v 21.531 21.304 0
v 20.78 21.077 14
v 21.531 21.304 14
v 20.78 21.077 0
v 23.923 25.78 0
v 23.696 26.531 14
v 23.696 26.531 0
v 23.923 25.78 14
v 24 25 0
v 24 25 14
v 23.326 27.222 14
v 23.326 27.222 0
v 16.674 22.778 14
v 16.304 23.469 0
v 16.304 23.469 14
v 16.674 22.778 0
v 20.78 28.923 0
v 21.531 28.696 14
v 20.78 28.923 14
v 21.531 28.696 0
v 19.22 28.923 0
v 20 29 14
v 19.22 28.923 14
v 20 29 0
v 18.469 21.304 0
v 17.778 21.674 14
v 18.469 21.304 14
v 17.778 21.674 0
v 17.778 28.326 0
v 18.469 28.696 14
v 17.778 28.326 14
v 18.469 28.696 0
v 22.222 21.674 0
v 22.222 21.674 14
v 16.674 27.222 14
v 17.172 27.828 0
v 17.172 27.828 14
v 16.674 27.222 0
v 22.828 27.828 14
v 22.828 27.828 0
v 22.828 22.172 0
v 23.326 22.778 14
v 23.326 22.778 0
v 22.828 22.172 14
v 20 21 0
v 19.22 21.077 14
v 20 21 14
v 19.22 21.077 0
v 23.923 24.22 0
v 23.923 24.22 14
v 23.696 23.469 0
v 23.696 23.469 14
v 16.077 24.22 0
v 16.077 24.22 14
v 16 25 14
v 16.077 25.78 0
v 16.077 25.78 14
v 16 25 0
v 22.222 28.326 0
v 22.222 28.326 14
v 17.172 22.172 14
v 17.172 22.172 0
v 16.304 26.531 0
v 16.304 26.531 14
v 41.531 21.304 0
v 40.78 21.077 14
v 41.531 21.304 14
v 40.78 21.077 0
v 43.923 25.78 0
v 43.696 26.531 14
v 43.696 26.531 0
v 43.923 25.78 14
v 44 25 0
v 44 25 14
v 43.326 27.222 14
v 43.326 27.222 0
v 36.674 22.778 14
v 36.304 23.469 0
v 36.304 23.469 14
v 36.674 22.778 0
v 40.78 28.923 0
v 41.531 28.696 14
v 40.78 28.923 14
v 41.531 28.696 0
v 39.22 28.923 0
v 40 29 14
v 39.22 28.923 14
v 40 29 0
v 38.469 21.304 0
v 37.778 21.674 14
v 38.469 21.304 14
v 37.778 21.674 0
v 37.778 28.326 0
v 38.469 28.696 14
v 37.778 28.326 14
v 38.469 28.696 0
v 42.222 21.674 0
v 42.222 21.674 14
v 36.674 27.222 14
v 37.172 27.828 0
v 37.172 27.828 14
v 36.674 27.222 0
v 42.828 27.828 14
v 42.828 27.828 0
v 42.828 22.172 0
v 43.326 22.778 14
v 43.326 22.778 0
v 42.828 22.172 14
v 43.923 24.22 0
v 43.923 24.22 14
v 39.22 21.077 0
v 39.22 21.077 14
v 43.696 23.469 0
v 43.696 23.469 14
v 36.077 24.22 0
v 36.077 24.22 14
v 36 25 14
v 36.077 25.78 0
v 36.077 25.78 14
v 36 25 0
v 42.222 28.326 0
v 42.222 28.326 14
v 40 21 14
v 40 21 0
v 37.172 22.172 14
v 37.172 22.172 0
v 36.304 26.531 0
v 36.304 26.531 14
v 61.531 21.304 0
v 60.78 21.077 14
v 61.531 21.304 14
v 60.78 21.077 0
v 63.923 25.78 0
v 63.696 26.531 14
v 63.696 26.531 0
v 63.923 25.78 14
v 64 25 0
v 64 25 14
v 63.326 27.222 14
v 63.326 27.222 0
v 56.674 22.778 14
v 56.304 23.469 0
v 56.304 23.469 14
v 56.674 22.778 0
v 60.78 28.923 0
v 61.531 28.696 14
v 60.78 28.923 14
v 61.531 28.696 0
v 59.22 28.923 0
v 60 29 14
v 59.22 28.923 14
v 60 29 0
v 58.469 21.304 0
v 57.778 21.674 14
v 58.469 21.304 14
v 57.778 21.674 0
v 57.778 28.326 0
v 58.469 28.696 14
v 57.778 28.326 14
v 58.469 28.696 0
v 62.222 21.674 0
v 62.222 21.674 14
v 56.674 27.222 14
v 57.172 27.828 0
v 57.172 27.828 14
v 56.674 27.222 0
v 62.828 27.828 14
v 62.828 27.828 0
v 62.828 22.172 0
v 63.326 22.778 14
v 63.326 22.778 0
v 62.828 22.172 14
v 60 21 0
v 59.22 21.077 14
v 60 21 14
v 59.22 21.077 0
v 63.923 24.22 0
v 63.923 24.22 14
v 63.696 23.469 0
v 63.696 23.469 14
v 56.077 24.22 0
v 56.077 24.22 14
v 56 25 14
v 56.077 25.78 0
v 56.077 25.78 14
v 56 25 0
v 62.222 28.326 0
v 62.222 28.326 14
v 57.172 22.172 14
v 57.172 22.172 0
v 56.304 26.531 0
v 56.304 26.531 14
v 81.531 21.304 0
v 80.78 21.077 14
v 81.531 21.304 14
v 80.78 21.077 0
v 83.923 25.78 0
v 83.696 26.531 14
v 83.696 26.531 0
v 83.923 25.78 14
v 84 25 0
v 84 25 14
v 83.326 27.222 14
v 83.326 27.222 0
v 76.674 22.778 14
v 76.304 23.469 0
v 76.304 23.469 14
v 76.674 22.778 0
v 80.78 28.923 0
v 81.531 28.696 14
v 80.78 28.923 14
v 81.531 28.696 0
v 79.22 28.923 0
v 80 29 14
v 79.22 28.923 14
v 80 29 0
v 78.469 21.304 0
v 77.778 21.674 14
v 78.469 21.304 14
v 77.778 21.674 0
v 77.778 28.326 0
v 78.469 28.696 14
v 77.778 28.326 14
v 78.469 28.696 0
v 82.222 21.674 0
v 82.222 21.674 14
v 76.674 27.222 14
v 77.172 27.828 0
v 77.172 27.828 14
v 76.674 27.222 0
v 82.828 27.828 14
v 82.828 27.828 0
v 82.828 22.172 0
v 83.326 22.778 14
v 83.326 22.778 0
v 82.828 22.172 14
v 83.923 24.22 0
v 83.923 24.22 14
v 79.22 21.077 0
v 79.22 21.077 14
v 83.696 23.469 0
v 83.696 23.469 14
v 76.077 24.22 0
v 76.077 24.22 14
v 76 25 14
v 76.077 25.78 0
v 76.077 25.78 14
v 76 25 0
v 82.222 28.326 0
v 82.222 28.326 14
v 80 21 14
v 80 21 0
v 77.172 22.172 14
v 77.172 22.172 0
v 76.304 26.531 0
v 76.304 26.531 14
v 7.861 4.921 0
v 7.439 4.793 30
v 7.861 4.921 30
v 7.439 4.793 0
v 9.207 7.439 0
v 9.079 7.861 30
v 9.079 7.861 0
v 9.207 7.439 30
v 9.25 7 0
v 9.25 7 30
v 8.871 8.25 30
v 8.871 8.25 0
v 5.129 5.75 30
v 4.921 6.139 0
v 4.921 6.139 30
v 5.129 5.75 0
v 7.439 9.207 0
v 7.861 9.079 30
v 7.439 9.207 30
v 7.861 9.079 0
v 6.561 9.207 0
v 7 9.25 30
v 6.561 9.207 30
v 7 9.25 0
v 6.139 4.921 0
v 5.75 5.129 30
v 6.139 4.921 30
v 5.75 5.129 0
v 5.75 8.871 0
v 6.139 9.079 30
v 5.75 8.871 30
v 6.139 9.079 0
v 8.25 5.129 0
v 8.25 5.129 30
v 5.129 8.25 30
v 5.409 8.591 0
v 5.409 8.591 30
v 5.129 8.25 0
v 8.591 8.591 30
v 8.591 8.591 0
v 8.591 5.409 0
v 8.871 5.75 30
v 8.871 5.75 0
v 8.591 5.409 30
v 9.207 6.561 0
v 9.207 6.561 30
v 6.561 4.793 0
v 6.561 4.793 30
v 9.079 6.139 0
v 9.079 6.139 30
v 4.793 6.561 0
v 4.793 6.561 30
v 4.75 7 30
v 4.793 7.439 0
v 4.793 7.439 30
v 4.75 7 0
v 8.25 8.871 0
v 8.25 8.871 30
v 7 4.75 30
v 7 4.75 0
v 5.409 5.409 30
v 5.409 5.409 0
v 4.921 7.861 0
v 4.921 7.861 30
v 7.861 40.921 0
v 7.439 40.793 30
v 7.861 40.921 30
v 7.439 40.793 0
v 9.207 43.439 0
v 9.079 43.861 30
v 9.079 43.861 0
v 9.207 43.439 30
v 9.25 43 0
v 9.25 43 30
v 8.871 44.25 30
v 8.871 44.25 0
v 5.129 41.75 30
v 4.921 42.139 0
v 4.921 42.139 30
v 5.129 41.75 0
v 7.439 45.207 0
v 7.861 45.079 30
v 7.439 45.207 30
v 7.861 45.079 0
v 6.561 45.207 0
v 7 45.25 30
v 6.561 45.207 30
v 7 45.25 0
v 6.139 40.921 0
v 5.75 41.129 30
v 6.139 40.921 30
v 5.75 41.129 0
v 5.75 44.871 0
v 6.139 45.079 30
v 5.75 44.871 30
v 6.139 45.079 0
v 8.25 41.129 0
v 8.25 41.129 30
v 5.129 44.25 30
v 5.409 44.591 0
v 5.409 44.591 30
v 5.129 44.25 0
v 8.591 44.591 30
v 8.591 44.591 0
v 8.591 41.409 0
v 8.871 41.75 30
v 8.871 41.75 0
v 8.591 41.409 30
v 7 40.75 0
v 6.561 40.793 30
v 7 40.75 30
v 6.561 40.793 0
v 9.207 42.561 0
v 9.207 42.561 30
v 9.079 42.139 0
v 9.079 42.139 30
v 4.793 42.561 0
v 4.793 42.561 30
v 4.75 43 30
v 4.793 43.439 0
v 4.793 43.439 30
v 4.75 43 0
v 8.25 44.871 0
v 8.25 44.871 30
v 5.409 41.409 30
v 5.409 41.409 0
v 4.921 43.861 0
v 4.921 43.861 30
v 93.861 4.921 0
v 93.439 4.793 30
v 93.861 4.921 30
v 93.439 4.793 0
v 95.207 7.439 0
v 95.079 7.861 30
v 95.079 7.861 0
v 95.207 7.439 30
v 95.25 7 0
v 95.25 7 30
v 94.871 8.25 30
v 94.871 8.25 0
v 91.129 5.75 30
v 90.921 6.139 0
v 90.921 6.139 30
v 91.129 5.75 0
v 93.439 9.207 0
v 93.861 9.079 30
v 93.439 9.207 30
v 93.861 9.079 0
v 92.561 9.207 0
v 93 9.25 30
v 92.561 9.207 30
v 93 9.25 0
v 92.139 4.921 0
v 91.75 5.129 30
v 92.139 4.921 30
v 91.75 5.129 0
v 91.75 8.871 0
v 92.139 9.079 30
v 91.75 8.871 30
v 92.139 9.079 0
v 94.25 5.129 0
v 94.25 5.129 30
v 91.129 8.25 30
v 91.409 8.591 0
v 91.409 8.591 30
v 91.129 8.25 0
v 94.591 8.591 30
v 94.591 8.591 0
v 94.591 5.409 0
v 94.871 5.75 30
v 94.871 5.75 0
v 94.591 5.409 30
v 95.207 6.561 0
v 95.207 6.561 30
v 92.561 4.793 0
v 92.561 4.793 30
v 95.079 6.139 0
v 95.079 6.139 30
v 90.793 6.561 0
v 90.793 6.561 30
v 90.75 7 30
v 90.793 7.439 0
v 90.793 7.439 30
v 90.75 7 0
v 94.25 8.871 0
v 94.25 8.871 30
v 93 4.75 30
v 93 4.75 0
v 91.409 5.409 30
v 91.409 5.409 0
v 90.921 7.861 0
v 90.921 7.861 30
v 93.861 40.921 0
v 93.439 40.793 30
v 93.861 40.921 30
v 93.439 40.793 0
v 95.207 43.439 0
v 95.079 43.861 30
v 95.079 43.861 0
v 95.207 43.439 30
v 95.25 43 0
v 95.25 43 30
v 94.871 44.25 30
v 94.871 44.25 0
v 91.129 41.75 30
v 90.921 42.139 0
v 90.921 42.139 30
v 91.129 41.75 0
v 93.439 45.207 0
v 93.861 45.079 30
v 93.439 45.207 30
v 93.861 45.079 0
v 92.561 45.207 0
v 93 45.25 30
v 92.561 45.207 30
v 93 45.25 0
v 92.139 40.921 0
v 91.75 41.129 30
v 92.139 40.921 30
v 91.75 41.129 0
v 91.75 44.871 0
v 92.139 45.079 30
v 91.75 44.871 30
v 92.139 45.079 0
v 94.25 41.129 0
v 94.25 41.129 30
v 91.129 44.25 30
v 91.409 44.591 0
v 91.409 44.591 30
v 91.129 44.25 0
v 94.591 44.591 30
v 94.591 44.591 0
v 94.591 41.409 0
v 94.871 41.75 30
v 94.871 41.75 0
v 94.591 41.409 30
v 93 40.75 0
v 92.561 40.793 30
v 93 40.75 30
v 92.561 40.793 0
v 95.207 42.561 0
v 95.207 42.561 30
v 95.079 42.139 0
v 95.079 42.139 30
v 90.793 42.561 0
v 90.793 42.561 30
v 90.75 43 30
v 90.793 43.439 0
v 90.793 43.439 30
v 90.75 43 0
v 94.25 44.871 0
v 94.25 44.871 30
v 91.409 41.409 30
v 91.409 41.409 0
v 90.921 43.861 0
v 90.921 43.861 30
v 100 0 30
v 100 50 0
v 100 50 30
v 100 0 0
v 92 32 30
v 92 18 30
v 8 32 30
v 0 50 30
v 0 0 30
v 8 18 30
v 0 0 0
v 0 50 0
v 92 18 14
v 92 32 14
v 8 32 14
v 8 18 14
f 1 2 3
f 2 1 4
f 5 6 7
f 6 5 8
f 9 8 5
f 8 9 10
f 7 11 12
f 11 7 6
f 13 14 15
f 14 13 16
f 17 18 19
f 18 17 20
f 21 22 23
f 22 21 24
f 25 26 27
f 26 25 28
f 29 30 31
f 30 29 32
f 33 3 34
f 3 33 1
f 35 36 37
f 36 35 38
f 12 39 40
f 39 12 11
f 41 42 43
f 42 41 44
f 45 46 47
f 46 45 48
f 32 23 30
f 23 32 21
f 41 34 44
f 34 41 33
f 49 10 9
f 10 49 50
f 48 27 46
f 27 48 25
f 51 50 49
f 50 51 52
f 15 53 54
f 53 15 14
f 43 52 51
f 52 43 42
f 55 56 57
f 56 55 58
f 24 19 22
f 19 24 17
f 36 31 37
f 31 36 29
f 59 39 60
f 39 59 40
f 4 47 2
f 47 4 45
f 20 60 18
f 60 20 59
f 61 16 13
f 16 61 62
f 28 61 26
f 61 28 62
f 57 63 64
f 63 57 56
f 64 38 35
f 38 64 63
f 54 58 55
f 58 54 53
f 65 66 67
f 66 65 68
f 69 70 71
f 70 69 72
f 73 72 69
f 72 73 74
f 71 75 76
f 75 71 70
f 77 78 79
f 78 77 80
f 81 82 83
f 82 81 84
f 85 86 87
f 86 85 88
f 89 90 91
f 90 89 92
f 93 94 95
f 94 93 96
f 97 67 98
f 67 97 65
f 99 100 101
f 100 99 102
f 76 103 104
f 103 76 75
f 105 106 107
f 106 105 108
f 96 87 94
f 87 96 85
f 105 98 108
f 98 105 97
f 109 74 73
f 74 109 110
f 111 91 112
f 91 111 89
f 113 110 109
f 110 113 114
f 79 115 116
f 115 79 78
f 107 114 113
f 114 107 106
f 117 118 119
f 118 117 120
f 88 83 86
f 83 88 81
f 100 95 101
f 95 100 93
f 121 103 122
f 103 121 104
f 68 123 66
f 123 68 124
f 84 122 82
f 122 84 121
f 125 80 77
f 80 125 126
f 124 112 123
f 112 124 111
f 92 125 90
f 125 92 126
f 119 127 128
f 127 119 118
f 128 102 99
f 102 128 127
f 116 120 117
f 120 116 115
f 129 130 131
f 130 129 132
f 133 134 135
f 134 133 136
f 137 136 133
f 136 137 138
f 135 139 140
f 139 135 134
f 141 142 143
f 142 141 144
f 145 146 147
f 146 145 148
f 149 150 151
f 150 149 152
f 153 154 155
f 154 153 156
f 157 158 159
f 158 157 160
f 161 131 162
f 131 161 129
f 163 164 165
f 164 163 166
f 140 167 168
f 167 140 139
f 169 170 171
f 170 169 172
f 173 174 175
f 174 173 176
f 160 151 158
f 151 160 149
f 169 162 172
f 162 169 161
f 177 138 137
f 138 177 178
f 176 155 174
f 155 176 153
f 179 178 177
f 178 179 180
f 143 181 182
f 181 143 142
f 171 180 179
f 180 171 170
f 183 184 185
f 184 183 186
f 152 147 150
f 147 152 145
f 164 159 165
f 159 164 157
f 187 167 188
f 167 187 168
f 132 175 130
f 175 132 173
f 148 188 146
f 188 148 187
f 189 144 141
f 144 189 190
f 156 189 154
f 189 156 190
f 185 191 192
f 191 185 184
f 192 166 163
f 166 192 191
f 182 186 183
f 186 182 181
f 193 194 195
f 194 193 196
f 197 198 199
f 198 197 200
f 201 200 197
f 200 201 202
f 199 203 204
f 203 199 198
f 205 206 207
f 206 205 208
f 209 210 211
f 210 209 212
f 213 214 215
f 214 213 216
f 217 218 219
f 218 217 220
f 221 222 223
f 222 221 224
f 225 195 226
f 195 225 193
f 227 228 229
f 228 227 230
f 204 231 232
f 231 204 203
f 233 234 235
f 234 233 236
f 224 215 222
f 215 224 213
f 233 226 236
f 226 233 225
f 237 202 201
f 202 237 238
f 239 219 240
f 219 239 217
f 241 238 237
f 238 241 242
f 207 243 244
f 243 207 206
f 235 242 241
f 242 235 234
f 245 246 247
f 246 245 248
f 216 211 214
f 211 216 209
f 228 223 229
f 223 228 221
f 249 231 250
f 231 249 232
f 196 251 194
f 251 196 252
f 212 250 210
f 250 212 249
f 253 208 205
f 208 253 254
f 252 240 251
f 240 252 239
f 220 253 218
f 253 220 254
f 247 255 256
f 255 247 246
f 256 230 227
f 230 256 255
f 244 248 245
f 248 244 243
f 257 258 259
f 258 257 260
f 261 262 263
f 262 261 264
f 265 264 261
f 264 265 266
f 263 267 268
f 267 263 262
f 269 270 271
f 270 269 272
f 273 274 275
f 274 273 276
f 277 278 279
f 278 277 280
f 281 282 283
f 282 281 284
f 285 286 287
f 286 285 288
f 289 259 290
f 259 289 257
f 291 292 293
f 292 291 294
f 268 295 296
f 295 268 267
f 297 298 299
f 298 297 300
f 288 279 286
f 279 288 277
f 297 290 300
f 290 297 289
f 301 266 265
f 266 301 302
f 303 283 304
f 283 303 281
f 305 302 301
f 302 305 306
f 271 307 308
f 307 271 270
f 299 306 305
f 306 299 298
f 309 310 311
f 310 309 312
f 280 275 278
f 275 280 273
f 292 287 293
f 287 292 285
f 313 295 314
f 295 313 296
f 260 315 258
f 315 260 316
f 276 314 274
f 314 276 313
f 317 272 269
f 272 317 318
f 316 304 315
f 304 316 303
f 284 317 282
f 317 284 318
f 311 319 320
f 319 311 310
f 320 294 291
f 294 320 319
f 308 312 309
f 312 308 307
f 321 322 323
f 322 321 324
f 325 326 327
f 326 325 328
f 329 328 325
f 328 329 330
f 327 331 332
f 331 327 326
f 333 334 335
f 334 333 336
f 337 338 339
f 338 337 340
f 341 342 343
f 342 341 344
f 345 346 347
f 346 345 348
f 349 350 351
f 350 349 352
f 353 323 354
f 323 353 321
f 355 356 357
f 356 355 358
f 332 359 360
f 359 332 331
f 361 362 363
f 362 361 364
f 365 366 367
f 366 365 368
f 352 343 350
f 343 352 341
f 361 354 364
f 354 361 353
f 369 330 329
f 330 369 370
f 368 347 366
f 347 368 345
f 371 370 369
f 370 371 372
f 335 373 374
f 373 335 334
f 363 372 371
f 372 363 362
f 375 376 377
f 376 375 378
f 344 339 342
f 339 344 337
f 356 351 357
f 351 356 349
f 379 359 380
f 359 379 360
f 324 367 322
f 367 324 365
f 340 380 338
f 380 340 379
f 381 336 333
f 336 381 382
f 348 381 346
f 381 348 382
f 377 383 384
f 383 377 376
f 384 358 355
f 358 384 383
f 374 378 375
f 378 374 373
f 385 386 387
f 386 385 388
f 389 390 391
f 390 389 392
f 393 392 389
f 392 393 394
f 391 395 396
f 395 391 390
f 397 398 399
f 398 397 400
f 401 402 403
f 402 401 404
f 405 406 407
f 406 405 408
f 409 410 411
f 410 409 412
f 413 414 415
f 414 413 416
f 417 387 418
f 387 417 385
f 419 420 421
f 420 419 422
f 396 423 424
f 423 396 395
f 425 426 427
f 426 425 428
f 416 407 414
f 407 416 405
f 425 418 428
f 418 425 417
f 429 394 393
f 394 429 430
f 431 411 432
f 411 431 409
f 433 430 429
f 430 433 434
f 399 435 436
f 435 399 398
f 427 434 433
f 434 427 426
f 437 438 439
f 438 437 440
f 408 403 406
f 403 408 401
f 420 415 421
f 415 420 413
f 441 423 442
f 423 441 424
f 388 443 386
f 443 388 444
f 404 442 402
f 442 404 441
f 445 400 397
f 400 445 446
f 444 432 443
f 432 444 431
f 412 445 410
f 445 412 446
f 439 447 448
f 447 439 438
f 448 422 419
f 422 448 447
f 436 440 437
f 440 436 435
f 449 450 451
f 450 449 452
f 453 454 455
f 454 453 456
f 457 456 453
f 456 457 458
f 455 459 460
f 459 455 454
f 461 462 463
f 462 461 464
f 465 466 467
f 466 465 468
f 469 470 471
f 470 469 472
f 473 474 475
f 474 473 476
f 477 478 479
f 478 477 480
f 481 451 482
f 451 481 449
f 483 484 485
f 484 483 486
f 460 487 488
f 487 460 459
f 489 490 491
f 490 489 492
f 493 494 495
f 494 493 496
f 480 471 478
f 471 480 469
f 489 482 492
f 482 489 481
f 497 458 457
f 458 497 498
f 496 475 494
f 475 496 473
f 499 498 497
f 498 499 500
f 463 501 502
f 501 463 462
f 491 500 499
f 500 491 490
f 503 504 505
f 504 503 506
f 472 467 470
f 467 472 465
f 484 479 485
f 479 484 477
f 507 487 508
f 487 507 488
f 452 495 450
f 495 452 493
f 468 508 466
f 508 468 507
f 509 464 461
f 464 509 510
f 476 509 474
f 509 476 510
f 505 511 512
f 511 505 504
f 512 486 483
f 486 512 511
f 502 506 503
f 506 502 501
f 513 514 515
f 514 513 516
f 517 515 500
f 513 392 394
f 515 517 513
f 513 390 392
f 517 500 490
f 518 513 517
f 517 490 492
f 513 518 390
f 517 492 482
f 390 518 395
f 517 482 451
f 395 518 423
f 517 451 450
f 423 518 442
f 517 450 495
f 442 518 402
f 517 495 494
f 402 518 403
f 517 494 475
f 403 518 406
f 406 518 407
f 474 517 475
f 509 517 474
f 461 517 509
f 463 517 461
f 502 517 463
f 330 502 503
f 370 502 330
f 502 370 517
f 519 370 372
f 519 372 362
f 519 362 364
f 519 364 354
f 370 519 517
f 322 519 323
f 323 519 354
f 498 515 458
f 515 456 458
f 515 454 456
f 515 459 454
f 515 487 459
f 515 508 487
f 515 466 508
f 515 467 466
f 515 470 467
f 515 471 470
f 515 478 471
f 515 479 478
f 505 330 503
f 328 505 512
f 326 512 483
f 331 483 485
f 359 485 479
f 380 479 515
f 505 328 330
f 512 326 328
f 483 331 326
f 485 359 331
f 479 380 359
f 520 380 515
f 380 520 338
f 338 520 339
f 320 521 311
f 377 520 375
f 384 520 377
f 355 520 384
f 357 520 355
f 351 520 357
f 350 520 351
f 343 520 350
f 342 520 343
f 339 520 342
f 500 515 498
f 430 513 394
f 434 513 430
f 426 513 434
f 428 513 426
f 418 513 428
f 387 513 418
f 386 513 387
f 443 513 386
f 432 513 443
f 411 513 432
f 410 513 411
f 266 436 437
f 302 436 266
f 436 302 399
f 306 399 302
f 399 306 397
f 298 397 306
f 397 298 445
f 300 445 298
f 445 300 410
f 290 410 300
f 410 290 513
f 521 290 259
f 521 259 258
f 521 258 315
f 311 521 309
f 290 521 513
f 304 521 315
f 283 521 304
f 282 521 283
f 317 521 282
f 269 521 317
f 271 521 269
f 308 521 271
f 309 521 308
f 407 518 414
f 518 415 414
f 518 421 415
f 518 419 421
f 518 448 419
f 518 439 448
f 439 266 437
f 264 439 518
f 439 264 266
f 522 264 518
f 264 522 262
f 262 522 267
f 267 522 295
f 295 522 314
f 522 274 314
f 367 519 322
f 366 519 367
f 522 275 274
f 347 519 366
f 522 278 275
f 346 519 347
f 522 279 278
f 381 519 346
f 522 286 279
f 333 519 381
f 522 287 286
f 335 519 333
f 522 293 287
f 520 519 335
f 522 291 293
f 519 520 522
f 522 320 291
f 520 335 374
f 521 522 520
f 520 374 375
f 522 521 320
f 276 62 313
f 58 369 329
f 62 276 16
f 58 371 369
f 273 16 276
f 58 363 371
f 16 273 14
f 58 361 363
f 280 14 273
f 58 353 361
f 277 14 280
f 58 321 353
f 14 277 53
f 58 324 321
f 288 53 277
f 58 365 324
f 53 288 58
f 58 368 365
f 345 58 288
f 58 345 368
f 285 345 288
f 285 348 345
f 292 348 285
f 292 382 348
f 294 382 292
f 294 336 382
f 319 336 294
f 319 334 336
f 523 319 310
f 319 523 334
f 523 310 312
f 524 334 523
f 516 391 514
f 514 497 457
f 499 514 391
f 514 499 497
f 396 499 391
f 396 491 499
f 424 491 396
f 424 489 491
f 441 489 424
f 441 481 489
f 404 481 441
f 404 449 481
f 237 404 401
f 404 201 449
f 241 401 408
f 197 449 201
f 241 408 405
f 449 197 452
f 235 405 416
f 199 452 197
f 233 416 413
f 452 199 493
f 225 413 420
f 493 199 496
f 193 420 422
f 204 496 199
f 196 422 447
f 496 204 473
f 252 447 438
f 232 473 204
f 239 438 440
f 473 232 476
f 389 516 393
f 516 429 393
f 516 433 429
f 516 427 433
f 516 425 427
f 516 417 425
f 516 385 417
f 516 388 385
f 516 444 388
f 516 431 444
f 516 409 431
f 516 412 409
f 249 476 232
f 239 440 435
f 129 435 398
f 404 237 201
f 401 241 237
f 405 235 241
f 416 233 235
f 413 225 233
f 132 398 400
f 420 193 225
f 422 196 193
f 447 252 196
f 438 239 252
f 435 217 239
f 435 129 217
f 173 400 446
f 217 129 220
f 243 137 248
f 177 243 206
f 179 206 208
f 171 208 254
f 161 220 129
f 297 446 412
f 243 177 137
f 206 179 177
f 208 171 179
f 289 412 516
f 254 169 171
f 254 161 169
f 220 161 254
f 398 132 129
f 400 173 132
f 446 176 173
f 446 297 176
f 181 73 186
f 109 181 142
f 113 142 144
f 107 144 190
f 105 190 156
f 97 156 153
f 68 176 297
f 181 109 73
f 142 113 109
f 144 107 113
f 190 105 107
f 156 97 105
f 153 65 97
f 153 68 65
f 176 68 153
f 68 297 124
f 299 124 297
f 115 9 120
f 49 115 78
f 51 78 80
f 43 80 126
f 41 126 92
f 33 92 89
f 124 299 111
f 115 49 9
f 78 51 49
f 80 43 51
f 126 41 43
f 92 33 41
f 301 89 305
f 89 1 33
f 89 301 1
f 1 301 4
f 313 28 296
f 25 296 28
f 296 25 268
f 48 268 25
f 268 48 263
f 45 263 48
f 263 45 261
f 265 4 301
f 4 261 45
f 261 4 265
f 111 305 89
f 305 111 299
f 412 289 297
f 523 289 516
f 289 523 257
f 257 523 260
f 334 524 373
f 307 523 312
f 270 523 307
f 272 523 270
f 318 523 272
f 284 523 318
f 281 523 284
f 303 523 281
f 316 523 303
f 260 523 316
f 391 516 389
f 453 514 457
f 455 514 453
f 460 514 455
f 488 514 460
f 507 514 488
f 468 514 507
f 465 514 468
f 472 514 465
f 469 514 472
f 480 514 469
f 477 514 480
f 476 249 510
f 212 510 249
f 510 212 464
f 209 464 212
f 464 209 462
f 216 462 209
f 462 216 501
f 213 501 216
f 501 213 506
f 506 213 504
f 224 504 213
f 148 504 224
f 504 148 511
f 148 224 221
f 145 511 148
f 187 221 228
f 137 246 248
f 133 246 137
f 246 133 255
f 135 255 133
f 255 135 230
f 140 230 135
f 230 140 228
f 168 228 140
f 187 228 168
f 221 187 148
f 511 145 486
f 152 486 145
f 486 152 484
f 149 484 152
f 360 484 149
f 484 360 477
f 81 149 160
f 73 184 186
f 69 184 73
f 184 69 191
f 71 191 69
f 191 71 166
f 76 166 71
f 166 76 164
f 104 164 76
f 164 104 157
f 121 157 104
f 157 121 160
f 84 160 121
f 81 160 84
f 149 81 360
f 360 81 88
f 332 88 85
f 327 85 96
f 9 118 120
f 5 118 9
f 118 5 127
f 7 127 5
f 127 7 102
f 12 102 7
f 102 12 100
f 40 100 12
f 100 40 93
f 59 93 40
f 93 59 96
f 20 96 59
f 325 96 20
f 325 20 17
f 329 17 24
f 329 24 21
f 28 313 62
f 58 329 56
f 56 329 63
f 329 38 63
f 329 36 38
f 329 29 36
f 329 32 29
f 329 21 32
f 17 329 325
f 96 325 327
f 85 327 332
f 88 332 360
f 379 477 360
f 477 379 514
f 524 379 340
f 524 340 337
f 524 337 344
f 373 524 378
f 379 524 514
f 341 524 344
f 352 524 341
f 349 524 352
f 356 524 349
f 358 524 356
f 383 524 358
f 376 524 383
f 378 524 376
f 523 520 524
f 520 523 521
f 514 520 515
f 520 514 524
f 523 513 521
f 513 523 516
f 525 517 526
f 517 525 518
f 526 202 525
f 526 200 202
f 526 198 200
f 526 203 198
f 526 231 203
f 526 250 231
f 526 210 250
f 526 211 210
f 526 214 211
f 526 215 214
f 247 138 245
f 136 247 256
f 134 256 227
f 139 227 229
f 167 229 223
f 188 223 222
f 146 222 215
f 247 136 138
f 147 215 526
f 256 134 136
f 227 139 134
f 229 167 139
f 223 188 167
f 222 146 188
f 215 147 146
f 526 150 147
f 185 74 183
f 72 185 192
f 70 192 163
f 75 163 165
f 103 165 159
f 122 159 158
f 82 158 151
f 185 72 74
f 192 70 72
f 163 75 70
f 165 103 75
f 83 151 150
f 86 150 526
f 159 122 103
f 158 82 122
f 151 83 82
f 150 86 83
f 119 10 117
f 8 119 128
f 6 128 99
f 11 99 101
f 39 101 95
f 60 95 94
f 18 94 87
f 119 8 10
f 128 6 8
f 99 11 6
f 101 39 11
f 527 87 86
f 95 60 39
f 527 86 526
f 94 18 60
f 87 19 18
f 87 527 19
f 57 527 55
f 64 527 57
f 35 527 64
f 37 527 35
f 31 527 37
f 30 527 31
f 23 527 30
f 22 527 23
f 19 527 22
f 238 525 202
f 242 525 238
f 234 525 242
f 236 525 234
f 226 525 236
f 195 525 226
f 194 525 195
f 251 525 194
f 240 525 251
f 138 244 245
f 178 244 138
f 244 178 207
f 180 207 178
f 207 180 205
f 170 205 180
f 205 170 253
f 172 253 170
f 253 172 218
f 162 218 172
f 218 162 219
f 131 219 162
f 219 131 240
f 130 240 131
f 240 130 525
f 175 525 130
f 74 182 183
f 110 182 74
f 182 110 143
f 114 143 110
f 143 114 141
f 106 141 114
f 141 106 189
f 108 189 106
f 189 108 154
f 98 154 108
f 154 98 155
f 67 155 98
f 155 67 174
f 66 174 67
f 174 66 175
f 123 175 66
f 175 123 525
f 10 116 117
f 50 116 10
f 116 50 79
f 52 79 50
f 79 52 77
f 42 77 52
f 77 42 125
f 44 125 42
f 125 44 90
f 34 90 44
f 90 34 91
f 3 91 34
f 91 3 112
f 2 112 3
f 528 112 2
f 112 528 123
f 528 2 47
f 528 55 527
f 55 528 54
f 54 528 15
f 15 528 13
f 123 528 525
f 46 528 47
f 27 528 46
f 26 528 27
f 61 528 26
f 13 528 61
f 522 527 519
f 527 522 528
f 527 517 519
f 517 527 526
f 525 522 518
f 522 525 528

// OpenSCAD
$fn = 32;

// ----------------------------------------------------------------------
// Manifold block: gallery_top manifold
// ----------------------------------------------------------------------

// --- parameters (mm) ---
block_l = 100;            // block length, X
block_w = 50;             // block width, Y
block_h = 30;             // block height, Z
port_d = 8;               // port bore diameter
port_pitch = 20;          // port pitch along X
gallery_d = 14;           // top gallery width, Y
gallery_depth = 16;       // gallery pocket depth
wall_p = 8;               // gallery end wall thickness, X
mnt_d = 4.5;              // mounting hole diameter
mnt_in = 7;               // mounting hole inset from the edges

n_ports = 4;  // ports in the row
port_x0 = (block_l - (n_ports - 1) * port_pitch) / 2;  // first port X

difference() {
  cube([block_l, block_w, block_h]);
  for (i = [0 : n_ports - 1])
    translate([port_x0 + i * port_pitch, block_w / 2, -1])
      cylinder(h = block_h + 2, d = port_d);
  translate([wall_p, block_w / 2 - gallery_d / 2, block_h - gallery_depth])
    cube([block_l - 2 * wall_p, gallery_d, gallery_depth + 1]);
  for (cx = [mnt_in, block_l - mnt_in])
    for (cy = [mnt_in, block_w - mnt_in])
      translate([cx, cy, -1]) cylinder(h = block_h + 2, d = mnt_d);
}
